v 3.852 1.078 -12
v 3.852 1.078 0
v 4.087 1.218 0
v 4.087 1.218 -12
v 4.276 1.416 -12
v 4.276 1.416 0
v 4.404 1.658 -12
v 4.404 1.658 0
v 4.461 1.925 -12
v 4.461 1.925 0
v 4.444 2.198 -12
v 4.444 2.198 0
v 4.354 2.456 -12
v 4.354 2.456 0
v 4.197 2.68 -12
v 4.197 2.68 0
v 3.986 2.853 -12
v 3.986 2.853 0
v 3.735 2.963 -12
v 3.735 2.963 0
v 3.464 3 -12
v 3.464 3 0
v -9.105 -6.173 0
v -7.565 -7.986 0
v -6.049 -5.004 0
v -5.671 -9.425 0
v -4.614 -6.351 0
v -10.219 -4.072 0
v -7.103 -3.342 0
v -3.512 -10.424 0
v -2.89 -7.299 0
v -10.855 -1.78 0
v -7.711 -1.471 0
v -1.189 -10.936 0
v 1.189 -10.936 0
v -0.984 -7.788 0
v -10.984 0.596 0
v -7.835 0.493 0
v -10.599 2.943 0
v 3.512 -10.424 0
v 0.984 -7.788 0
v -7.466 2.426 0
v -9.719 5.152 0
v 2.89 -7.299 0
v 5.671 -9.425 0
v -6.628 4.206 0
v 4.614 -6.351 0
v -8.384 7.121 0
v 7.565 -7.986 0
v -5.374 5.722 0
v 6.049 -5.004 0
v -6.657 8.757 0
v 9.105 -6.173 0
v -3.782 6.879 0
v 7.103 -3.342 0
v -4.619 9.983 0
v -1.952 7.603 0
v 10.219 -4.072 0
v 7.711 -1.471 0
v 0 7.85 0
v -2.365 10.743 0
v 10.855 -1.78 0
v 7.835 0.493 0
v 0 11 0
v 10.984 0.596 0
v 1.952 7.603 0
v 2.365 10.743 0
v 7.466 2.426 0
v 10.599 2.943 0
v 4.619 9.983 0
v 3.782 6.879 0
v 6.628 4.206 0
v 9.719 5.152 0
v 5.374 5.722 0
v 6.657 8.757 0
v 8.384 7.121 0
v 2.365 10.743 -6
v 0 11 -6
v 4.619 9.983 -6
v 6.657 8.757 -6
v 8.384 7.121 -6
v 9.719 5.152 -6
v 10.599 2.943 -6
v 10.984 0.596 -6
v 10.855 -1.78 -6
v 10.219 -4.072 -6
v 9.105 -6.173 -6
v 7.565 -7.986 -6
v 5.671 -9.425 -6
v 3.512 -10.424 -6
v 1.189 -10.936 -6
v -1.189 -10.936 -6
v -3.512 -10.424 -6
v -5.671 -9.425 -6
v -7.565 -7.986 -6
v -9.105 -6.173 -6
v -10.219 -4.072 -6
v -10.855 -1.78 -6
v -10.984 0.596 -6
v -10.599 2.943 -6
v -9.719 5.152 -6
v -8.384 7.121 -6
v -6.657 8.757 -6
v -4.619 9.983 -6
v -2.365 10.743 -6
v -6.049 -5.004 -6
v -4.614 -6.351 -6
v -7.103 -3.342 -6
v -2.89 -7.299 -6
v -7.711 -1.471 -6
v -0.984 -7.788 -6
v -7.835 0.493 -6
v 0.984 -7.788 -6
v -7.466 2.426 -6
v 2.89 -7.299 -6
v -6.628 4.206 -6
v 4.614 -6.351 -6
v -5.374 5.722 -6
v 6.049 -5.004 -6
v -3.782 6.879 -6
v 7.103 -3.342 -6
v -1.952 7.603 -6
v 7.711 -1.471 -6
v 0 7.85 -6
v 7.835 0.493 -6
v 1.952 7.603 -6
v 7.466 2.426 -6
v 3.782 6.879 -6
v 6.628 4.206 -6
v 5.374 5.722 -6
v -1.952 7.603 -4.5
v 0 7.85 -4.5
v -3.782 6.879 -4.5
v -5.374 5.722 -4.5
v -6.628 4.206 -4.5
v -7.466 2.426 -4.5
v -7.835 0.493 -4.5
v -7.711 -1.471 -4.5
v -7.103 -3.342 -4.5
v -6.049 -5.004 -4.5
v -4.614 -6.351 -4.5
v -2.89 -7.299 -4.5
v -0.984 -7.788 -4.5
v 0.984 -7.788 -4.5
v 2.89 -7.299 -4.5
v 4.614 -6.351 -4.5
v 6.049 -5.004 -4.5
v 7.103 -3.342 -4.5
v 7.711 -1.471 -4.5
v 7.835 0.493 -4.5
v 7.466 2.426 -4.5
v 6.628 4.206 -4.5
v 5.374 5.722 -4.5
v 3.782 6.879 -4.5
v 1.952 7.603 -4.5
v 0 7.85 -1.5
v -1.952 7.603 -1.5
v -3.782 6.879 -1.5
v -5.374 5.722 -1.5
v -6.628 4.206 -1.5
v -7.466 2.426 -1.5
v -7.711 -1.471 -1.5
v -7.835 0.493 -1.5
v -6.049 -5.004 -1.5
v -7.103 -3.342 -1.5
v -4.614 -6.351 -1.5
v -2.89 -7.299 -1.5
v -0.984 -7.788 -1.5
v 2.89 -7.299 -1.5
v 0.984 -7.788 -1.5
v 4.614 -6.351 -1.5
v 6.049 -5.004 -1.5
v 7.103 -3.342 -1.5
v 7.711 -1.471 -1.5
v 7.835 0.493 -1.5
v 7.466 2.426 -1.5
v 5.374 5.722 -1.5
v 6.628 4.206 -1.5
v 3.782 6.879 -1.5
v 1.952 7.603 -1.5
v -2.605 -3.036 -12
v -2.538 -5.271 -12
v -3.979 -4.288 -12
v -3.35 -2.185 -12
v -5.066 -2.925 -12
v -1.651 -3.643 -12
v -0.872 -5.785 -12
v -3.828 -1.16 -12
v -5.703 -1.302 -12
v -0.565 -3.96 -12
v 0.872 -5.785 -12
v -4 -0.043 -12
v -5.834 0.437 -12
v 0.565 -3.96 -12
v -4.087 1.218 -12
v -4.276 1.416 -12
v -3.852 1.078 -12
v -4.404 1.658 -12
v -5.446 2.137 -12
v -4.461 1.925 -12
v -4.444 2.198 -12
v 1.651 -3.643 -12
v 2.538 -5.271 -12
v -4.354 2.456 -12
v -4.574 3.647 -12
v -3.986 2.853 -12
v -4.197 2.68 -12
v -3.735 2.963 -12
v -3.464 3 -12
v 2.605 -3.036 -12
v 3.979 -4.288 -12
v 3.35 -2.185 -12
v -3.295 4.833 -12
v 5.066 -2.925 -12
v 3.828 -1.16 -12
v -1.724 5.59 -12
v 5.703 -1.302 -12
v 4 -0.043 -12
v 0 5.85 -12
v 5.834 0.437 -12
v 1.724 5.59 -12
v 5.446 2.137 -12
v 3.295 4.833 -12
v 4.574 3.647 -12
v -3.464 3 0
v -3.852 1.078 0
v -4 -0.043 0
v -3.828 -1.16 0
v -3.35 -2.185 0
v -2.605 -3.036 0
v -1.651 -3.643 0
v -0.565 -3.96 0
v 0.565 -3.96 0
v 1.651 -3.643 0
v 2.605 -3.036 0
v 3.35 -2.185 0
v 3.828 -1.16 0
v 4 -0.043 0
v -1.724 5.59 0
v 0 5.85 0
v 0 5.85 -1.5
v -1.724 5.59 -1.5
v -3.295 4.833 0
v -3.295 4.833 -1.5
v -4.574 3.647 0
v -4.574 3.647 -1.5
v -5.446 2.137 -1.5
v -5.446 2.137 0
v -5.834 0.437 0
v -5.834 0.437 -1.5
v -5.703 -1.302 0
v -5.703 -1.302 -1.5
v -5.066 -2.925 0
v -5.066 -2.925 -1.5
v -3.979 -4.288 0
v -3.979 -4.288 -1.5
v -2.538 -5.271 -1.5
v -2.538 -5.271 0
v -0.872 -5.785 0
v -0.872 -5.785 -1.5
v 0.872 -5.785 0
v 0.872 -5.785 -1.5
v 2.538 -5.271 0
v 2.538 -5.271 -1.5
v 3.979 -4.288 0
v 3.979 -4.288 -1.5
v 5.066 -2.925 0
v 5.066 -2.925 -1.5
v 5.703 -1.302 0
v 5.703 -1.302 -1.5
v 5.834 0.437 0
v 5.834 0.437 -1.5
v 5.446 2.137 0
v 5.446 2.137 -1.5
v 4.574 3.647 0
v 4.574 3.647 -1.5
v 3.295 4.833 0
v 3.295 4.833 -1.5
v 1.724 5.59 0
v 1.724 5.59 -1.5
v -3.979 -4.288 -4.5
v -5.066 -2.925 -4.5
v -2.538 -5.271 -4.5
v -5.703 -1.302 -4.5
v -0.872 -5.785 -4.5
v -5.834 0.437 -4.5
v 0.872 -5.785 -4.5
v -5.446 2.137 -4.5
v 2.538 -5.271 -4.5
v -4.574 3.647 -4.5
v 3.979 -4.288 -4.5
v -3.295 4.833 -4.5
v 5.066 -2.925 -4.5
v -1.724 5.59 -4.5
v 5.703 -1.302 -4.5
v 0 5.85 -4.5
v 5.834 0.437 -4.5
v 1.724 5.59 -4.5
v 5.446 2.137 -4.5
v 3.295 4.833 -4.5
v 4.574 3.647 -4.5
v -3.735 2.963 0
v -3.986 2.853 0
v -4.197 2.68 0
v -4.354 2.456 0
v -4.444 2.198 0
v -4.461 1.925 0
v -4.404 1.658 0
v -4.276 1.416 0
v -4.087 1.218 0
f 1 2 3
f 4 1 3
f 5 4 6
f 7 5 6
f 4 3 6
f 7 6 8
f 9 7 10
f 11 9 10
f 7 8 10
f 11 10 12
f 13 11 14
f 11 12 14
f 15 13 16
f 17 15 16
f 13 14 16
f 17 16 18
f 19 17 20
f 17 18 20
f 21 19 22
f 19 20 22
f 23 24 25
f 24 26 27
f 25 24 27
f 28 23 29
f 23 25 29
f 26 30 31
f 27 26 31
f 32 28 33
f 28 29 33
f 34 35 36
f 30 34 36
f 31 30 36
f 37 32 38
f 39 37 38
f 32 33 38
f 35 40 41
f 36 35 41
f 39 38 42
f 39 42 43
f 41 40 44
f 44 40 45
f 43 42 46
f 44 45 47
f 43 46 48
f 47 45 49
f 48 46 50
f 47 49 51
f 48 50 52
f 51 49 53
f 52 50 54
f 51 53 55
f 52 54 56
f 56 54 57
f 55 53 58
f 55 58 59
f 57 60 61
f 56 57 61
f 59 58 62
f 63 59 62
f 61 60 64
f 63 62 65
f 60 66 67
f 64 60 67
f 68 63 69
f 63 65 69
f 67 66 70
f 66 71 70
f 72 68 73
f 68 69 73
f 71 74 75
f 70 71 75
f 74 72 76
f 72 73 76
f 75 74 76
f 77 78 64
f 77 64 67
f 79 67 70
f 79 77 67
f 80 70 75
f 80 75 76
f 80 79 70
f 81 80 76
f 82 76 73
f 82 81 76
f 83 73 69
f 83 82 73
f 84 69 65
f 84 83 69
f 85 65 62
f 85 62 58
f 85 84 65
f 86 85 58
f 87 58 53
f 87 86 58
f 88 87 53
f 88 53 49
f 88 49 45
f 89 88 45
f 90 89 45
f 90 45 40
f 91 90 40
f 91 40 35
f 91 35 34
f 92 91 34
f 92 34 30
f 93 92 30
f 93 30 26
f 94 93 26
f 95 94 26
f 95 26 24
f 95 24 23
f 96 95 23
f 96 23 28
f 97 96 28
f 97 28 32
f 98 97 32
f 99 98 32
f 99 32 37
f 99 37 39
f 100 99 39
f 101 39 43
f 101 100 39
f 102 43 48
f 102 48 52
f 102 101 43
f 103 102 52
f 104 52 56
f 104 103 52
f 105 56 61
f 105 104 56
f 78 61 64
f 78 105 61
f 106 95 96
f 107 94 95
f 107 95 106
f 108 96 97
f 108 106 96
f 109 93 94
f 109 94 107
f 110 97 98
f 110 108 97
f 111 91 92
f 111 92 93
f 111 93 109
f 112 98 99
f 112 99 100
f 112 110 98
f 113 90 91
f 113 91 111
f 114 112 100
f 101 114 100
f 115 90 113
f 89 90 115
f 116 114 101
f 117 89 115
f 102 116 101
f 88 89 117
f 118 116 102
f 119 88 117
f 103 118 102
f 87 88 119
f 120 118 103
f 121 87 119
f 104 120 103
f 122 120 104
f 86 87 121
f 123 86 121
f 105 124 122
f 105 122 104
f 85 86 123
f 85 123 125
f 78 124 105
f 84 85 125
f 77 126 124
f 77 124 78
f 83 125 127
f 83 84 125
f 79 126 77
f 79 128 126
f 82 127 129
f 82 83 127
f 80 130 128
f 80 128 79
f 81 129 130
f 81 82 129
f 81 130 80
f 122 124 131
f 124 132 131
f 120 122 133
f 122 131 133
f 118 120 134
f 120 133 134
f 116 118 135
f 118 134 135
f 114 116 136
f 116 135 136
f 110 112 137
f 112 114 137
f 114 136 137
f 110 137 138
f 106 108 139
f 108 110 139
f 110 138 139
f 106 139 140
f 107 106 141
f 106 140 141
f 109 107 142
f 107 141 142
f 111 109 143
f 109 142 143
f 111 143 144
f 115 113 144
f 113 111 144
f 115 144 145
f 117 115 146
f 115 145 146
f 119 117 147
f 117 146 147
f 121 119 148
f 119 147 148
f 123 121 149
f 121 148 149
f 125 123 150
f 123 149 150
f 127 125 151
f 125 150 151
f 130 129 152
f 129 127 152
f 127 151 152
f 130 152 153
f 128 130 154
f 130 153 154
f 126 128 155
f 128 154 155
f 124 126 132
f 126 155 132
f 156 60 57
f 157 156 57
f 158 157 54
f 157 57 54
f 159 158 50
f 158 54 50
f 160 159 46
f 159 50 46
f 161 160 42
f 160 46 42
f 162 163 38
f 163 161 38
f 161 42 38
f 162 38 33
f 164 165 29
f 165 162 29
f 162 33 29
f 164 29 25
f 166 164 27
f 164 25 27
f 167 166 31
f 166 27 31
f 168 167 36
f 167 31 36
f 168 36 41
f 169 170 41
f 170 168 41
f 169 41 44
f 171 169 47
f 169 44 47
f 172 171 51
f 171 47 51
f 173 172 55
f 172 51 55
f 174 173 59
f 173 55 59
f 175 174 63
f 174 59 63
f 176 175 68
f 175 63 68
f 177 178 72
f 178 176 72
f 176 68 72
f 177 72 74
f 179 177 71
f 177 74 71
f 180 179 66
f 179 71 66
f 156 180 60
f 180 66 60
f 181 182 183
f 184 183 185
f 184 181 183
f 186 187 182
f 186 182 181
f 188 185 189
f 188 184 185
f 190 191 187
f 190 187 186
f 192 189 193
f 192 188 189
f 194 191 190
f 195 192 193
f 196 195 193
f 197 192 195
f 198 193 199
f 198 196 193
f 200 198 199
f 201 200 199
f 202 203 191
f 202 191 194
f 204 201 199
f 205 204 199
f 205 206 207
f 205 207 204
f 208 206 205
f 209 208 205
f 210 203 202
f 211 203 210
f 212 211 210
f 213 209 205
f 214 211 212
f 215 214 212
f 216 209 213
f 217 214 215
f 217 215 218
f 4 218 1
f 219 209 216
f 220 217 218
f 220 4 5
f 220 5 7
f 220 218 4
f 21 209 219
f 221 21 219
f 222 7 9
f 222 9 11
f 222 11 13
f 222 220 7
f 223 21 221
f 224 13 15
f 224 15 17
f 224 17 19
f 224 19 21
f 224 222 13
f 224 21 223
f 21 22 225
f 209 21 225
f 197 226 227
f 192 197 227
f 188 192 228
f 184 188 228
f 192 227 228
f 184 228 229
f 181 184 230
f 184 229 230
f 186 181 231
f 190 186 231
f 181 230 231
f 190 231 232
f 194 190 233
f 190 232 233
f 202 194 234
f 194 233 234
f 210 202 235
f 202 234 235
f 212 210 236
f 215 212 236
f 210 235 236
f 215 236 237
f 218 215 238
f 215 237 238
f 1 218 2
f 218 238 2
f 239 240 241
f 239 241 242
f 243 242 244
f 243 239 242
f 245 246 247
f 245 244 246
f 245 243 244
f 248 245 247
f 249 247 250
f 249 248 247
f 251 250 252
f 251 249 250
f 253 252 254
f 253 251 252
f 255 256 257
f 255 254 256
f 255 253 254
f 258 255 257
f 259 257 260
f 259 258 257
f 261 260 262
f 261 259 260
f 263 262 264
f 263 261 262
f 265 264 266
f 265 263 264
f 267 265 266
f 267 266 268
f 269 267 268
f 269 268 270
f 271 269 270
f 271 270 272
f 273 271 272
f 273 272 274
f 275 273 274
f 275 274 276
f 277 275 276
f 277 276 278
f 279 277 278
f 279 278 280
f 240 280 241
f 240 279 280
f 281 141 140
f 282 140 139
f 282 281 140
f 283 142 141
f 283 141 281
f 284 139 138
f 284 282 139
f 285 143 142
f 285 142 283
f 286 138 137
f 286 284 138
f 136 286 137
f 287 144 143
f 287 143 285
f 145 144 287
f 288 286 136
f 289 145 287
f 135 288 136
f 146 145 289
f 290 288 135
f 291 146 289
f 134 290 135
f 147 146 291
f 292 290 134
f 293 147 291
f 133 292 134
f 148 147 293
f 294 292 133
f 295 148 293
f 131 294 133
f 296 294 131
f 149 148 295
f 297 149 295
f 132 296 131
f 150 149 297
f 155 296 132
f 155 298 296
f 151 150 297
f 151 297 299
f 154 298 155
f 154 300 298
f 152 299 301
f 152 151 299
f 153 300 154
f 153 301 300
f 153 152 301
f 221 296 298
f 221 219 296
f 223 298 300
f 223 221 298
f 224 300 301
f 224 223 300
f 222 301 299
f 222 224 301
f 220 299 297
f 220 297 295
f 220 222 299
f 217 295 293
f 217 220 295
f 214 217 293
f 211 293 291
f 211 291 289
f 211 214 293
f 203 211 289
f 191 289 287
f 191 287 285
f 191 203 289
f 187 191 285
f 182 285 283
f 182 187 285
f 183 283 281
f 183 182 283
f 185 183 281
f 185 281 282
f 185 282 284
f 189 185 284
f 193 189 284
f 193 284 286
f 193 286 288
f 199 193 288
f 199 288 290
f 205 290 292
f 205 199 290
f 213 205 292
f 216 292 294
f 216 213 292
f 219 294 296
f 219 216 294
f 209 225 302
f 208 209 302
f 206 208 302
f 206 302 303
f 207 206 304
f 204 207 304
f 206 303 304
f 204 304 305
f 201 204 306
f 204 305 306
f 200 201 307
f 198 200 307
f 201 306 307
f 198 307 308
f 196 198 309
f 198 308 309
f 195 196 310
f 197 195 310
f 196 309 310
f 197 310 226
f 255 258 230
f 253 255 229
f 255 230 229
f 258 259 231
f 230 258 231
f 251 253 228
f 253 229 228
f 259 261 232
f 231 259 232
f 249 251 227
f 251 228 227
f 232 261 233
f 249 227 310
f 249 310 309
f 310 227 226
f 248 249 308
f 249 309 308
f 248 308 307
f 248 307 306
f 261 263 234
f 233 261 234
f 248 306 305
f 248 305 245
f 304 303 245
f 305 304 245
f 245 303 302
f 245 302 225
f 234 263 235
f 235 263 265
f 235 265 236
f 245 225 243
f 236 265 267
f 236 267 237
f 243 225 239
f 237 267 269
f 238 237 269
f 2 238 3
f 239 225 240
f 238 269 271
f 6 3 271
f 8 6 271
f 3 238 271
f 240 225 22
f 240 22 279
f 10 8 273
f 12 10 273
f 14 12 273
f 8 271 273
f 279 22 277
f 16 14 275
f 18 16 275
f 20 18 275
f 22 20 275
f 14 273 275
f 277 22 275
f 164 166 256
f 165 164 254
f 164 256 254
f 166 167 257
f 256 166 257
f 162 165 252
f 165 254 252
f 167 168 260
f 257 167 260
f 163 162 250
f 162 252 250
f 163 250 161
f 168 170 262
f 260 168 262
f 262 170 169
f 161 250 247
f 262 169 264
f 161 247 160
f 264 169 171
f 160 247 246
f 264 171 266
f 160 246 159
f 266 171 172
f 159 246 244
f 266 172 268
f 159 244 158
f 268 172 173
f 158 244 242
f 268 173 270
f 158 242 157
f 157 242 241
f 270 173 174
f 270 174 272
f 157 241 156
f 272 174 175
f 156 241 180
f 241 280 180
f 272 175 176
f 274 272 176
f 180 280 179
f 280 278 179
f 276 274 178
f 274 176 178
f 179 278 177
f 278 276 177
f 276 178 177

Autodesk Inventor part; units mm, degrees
ref_plane "YZ Plane" through (0, 0, 0) normal (1, 0, 0) x (0, 1, 0)
ref_plane "XZ Plane" through (0, 0, 0) normal (0, 1, 0) x (-1, 0, 0)
ref_plane "XY Plane" through (0, 0, 0) normal (0, 0, 1) x (1, 0, 0)
sketch "Esquisse1" plane through (0, 0, 0) normal (1, 0, 0) x (0, 1, 0)
  line L0 (0, 21.0755) -> (0, -24.2543)
  line L1 (7.85, -1.5) -> (7.85, 0)
  line L2 (7.85, 0) -> (11, 0)
  line L3 (11, 0) -> (11, -6)
  line L4 (11, -6) -> (7.85, -6)
  line L5 (7.85, -6) -> (7.85, -4.5)
  line L6 (7.85, -4.5) -> (5.85, -4.5)
  line L7 (5.85, -4.5) -> (5.85, -12)
  line L8 (5.85, -12) -> (2.5, -12)
  line L9 (7.85, -1.5) -> (5.85, -1.5)
  line L10 (5.85, -1.5) -> (5.85, 0)
  line L11 (5.85, 0) -> (2.5, 0)
  line L12 (2.5, 0) -> (2.5, -12)
  line L13 (6.85, -1.5) -> (6.85, -4.5) construction
  line L14 (6.85, -3) -> (11, -3) construction
  point P0 (0, 0)
  point P1 (7.85, -5.25)
  dimension "d0" = 11.7
  dimension "d1" = 5
  dimension "d2" = 12
  dimension "d3" = 6
  dimension "d4" = 22
  dimension "d5" = 2
  dimension "d6" = 3
revolve "Révolution1" add sketch "Esquisse1" angle 360 about axis through (0, 0, 21.0755) along (0, 0, -1)
sketch "Esquisse2" plane through (0, 0, 0) normal (0, 0, 1) x (1, 0, 0)
  arc A0 (-2.6458, 3) -> (-3.8519, 1.0783) centre (0, 0) ccw construction
  line L0 (-3.4641, 2) -> (3.4641, 2) construction
  line L1 (-3.4641, 1) -> (3.4641, 1) construction
  line L2 (3.4641, 3) -> (-3.4641, 3)
  arc A1 (-3.4641, 3) -> (-3.8519, 1.0783) centre (-3.4641, 2) ccw
  arc A2 (3.4641, 1) -> (3.8519, 1.0783) centre (3.4641, 2) ccw construction
  arc A3 (-3.8519, 1.0783) -> (-3.4641, 1) centre (-3.4641, 2) ccw construction
  arc A4 (3.8519, 1.0783) -> (3.4641, 3) centre (3.4641, 2) ccw
  arc A5 (2.6458, 3) -> (-2.6458, 3) centre (0, 0) ccw construction
  arc A6 (-3.8519, 1.0783) -> (3.8519, 1.0783) centre (0, 0) ccw
  arc A7 (3.8519, 1.0783) -> (2.6458, 3) centre (0, 0) ccw construction
  point P0 (0, 2)
  dimension "d9" = 1
  dimension "d11" = 3
  dimension "d12" = 4
extrude "Extrusion1" cut sketch "Esquisse2" against normal through all
properties part number "engrenage_simplifie_v3"
